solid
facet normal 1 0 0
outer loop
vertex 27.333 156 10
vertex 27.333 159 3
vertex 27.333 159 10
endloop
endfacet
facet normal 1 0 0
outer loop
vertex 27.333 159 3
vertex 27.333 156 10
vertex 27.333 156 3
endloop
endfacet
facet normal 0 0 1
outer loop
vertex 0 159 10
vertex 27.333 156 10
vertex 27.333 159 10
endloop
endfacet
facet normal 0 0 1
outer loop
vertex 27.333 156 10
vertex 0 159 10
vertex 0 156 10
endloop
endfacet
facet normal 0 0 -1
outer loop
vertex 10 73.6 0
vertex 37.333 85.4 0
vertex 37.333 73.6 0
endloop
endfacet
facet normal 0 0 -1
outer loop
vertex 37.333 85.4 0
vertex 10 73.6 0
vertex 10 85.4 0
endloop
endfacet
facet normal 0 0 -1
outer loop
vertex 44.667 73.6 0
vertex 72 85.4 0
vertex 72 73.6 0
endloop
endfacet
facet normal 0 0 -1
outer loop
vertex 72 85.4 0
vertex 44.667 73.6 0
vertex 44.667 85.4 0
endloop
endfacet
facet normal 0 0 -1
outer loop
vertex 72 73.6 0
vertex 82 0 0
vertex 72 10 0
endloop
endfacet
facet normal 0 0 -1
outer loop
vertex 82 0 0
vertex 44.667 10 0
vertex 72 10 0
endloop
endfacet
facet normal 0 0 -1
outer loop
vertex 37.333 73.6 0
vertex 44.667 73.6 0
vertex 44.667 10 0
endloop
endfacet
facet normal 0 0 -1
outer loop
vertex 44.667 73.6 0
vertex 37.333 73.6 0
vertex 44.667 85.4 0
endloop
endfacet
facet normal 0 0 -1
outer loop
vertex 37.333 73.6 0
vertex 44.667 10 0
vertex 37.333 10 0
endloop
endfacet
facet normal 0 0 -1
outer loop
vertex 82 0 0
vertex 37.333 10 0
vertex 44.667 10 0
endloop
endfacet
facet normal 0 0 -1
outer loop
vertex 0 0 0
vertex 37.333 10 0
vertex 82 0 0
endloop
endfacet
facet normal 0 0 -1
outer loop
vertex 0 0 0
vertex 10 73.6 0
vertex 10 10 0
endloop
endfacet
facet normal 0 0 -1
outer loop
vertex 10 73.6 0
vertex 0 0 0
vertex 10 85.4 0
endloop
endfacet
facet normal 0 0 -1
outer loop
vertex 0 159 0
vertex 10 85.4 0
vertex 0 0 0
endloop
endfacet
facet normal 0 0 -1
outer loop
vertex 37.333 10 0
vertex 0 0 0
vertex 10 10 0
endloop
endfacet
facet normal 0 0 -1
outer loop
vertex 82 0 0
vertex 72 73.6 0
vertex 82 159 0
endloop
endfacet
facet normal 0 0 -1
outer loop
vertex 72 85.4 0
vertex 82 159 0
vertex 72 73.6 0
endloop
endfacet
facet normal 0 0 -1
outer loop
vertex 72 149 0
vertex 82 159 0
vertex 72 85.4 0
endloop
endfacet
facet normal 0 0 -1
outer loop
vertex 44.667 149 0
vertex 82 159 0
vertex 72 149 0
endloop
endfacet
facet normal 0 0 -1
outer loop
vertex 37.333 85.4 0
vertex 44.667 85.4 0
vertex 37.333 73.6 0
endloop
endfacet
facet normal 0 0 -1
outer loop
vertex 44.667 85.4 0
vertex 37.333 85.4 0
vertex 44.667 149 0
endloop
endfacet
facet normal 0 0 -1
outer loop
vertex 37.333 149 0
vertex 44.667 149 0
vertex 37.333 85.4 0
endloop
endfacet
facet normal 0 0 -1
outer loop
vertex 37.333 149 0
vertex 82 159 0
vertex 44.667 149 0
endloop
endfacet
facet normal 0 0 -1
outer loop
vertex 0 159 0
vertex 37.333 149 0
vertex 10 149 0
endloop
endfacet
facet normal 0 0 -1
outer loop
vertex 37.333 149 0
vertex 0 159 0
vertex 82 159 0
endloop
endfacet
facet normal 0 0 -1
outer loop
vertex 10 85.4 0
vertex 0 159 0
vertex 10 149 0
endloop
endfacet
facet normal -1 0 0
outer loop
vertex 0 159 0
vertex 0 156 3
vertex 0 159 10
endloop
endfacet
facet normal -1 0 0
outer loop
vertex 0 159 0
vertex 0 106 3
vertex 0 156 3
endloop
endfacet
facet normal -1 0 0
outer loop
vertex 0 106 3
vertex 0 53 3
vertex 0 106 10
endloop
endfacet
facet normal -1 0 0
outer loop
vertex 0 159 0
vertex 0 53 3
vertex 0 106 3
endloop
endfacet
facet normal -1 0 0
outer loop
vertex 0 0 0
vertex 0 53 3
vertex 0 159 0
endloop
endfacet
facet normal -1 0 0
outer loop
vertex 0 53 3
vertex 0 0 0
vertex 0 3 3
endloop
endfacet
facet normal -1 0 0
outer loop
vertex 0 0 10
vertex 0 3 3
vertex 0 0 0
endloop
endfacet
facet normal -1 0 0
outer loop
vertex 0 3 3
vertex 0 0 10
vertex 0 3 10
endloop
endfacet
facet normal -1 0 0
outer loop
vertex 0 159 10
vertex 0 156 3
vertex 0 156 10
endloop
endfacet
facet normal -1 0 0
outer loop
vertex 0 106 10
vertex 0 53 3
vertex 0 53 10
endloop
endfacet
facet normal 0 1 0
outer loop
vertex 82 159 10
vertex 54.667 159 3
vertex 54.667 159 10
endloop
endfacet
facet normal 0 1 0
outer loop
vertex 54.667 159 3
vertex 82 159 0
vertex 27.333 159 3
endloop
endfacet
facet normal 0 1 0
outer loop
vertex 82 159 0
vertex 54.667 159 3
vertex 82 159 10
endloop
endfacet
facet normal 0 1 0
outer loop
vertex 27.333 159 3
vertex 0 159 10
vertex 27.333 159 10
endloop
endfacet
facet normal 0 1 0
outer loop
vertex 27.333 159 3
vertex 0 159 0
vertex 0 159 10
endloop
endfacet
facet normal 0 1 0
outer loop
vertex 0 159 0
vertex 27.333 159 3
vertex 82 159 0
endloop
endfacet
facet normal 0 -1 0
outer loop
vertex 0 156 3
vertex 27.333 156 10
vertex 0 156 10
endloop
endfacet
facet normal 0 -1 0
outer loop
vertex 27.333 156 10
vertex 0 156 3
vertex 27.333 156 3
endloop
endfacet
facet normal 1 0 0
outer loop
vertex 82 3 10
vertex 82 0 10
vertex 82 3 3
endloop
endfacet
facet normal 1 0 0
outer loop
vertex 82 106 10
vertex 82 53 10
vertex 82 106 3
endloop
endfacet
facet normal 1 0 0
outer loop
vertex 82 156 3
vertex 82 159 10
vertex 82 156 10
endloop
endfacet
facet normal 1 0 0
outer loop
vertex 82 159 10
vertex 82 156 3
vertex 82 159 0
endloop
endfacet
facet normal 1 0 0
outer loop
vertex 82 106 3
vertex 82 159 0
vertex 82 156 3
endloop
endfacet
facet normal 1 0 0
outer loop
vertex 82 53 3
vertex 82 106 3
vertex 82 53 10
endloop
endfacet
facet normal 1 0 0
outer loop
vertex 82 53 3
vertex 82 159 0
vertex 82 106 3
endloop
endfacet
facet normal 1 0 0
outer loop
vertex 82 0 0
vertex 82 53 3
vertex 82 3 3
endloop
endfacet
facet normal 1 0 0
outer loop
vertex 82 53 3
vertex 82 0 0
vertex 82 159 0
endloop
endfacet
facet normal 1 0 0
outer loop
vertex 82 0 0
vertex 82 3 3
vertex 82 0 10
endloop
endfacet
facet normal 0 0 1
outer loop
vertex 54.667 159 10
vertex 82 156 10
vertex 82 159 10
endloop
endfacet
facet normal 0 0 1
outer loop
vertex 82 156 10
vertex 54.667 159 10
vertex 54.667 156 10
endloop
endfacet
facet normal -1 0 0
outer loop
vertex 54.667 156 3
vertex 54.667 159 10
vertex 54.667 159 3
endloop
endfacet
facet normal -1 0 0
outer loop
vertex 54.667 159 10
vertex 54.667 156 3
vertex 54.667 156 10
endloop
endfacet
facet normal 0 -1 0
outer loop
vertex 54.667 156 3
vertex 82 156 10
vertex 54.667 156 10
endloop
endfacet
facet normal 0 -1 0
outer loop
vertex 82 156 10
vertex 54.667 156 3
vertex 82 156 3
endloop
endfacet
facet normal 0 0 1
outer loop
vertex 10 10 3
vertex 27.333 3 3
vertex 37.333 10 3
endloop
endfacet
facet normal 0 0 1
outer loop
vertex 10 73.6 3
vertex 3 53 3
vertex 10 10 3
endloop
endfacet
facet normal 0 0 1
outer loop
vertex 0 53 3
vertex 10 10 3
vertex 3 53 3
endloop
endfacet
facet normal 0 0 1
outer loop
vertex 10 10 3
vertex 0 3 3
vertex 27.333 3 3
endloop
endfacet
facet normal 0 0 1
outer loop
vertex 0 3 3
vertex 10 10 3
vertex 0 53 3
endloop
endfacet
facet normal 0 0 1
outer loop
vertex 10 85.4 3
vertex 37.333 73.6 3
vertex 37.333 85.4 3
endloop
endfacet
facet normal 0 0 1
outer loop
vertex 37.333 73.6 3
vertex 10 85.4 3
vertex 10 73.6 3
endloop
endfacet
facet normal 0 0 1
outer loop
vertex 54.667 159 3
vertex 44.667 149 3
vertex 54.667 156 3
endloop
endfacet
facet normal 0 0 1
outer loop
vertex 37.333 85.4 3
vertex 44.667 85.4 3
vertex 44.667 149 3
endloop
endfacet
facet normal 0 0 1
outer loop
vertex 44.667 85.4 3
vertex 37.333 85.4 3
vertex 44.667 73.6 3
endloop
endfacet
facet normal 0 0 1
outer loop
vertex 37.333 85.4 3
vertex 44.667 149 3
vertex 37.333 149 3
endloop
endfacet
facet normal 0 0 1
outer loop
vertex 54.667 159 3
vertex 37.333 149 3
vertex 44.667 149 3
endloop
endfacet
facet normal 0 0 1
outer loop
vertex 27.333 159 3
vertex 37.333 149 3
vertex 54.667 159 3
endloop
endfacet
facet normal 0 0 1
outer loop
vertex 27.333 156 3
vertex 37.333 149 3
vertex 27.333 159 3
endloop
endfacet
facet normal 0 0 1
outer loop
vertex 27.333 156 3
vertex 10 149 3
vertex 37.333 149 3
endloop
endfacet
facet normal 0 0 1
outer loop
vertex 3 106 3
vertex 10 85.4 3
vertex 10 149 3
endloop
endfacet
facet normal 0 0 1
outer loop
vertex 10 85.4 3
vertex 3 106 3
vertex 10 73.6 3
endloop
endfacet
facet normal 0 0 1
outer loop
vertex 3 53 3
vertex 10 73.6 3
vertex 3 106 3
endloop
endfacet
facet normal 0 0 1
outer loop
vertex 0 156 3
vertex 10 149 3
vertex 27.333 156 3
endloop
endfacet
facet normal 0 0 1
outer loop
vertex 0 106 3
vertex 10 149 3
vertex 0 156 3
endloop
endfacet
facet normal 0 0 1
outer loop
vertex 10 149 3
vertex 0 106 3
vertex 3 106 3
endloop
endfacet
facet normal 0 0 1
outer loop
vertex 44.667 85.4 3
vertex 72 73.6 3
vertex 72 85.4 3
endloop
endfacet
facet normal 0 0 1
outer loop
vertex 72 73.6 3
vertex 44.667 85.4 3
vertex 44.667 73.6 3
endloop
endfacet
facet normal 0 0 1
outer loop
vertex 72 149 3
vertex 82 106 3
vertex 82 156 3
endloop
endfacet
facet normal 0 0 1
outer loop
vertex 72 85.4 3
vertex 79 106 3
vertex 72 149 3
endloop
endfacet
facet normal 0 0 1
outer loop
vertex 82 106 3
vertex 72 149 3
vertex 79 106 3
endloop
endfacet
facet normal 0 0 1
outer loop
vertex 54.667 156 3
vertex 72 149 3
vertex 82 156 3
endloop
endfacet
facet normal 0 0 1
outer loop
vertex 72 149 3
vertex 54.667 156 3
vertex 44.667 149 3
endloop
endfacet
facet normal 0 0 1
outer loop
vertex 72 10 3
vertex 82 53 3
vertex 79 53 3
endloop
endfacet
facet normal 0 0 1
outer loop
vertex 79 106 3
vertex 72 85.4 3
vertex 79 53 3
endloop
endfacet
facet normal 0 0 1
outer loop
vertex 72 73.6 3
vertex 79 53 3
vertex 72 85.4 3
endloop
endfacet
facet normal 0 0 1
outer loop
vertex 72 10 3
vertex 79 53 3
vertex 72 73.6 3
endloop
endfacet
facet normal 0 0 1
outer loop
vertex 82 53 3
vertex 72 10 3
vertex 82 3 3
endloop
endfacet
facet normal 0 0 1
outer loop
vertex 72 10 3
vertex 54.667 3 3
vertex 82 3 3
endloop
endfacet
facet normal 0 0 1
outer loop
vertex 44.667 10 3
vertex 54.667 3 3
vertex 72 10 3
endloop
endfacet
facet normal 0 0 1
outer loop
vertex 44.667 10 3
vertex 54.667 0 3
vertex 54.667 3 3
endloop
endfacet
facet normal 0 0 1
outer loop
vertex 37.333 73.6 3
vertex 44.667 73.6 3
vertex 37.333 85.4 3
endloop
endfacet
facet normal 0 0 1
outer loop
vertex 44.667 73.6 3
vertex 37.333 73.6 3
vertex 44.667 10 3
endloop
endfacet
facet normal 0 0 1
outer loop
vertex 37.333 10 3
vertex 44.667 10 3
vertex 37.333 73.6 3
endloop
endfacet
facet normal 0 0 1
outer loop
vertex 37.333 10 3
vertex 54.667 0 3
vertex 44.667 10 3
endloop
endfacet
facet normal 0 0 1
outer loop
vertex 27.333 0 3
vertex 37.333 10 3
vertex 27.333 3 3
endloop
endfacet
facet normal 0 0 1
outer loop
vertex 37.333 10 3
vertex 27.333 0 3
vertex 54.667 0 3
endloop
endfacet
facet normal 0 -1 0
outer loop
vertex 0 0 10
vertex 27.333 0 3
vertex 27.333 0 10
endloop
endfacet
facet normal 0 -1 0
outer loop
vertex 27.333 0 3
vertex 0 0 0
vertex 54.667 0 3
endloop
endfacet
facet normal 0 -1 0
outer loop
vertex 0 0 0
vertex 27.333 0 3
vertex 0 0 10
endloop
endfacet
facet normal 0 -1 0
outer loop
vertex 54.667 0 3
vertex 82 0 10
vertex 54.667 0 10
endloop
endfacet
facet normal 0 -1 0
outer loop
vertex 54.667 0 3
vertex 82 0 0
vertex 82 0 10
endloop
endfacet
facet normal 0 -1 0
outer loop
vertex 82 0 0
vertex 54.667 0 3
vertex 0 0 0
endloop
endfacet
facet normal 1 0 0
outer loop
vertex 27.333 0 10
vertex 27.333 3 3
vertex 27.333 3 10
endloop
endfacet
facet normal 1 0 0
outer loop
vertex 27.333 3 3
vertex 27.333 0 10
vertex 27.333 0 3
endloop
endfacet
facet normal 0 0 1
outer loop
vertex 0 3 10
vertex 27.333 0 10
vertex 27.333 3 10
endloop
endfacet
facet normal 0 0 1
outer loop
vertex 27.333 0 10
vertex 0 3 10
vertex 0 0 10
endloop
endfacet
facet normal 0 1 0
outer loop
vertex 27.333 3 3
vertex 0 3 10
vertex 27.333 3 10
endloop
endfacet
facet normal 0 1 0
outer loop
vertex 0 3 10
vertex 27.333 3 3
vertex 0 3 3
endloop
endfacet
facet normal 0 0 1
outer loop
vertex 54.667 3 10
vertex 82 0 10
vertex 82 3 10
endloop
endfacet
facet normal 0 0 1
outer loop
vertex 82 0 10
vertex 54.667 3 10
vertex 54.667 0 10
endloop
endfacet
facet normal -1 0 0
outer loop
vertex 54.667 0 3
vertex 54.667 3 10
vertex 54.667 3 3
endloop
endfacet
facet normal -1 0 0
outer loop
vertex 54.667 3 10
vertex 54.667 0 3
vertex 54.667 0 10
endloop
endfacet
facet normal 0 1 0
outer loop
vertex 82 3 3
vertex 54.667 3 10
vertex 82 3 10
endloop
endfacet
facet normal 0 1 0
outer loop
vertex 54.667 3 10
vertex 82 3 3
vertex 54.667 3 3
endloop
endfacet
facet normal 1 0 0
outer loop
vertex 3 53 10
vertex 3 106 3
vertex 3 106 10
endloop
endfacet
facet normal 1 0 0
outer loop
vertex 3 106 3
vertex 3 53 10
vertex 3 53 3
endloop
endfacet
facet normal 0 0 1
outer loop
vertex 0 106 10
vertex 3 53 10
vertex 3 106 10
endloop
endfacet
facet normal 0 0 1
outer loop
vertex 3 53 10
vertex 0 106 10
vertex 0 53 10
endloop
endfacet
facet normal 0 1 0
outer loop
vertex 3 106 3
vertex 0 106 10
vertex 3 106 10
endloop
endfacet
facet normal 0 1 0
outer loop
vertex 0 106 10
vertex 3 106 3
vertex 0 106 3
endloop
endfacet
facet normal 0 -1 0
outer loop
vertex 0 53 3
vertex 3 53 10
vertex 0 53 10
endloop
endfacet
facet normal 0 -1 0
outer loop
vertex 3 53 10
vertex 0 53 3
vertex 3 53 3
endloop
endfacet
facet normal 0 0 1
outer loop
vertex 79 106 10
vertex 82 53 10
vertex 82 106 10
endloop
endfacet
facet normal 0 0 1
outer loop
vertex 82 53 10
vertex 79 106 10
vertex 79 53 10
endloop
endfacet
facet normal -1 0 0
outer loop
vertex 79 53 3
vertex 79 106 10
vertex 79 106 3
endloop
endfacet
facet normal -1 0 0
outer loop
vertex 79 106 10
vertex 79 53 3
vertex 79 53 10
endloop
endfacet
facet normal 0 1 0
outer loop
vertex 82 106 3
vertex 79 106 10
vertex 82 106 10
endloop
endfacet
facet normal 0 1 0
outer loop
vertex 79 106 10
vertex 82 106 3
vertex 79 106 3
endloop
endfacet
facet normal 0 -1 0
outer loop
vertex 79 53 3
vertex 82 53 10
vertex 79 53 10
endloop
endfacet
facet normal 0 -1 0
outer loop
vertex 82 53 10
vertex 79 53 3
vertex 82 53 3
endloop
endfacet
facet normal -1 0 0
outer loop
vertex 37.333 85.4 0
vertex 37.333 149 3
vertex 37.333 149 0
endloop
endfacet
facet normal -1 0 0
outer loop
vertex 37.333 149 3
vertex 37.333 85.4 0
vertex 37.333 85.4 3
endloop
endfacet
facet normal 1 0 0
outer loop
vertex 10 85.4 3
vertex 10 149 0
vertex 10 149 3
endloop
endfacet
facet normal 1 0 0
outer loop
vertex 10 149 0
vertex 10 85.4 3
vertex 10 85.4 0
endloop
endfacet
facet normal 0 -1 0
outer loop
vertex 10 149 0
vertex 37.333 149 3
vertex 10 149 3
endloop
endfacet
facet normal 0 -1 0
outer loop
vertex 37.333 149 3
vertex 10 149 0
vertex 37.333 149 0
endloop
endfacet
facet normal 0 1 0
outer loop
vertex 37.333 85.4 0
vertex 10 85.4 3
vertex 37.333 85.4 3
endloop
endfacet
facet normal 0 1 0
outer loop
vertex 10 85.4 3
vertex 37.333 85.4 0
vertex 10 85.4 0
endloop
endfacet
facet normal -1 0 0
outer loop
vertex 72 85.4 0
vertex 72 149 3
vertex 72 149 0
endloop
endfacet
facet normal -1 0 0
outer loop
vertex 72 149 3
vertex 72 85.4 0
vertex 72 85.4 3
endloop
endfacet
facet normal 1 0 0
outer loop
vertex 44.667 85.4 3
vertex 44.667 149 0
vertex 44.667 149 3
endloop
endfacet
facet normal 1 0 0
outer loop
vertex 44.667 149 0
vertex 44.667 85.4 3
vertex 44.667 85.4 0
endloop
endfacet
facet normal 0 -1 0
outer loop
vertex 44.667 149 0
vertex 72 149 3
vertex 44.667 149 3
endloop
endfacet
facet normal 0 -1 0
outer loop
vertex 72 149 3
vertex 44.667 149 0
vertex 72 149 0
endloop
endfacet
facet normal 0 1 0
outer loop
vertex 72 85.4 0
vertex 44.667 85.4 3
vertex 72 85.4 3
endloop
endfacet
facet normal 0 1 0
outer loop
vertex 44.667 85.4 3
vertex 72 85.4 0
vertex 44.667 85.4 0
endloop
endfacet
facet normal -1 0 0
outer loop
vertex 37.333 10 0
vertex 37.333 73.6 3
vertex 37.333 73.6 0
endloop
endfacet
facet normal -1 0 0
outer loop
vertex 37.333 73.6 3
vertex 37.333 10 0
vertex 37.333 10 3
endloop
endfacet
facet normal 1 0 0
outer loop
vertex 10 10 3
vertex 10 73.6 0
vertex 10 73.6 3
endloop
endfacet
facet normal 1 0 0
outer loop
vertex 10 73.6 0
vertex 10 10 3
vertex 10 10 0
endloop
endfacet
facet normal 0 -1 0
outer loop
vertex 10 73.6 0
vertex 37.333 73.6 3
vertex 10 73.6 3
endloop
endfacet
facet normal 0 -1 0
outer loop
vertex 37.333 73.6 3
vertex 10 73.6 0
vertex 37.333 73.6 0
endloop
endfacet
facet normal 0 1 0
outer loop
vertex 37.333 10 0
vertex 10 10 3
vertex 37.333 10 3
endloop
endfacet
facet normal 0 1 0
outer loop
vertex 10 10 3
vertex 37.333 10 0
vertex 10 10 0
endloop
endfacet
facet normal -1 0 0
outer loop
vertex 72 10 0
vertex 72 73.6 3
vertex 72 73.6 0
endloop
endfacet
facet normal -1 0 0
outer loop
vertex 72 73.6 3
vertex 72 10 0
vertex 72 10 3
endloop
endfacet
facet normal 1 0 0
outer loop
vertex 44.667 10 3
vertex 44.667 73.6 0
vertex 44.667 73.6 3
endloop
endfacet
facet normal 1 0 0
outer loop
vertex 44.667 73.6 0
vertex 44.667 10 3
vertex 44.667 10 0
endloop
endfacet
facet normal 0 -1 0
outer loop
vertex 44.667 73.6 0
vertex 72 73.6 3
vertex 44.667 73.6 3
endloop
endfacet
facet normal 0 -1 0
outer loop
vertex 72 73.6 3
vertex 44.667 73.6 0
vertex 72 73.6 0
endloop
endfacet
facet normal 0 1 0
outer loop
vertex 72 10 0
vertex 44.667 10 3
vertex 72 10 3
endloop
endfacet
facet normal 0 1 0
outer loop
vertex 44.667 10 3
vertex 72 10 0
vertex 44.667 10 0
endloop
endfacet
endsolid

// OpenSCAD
deviceWidth = 76.0;
deviceHeight = 153.0;

platformHeight = 3.0;
platformWallHeight = 10.0;
platformWallThickness = 3.0;

totalWidth = deviceWidth + platformWallThickness * 2;
totalHeight = deviceHeight + platformWallThickness * 2;

holeRadius = 5.0;

module cutout() {
	cube([totalWidth / 3, totalHeight / 2.5, platformHeight]);
}

difference() {
	union() {
		// main platform
		cube([totalWidth, totalHeight, platformHeight]);

		// top supports
		cube([totalWidth / 3, platformWallThickness, platformWallHeight]);
		translate([totalWidth - totalWidth / 3, 0, 0]) {
			cube([totalWidth / 3, platformWallThickness, platformWallHeight]);
		}

		// bottom supports
		translate([0, totalHeight - platformWallThickness, 0]) {
			cube([totalWidth / 3, platformWallThickness, platformWallHeight]);
			translate([totalWidth - totalWidth / 3, 0, 0]) {
				cube([totalWidth / 3, platformWallThickness, platformWallHeight]);
			}
		}
	
		// left side support
		translate([0, (totalHeight - totalHeight / 3) / 2]) {
			cube([platformWallThickness, totalHeight / 3, platformWallHeight]);
		}
		translate([totalWidth - platformWallThickness, (totalHeight - totalHeight / 3) / 2]) {
			cube([platformWallThickness, totalHeight / 3, platformWallHeight]);
		}
	}
	translate([10, 10, 0]) cutout();
	translate([totalWidth - totalWidth / 3 - 10, 10, 0]) cutout();
	translate([0, totalHeight - totalHeight / 2.5 - 20, 0]) {
		translate([10, 10, 0]) cutout();
		translate([totalWidth - totalWidth / 3 - 10, 10, 0]) cutout();
	}
}
